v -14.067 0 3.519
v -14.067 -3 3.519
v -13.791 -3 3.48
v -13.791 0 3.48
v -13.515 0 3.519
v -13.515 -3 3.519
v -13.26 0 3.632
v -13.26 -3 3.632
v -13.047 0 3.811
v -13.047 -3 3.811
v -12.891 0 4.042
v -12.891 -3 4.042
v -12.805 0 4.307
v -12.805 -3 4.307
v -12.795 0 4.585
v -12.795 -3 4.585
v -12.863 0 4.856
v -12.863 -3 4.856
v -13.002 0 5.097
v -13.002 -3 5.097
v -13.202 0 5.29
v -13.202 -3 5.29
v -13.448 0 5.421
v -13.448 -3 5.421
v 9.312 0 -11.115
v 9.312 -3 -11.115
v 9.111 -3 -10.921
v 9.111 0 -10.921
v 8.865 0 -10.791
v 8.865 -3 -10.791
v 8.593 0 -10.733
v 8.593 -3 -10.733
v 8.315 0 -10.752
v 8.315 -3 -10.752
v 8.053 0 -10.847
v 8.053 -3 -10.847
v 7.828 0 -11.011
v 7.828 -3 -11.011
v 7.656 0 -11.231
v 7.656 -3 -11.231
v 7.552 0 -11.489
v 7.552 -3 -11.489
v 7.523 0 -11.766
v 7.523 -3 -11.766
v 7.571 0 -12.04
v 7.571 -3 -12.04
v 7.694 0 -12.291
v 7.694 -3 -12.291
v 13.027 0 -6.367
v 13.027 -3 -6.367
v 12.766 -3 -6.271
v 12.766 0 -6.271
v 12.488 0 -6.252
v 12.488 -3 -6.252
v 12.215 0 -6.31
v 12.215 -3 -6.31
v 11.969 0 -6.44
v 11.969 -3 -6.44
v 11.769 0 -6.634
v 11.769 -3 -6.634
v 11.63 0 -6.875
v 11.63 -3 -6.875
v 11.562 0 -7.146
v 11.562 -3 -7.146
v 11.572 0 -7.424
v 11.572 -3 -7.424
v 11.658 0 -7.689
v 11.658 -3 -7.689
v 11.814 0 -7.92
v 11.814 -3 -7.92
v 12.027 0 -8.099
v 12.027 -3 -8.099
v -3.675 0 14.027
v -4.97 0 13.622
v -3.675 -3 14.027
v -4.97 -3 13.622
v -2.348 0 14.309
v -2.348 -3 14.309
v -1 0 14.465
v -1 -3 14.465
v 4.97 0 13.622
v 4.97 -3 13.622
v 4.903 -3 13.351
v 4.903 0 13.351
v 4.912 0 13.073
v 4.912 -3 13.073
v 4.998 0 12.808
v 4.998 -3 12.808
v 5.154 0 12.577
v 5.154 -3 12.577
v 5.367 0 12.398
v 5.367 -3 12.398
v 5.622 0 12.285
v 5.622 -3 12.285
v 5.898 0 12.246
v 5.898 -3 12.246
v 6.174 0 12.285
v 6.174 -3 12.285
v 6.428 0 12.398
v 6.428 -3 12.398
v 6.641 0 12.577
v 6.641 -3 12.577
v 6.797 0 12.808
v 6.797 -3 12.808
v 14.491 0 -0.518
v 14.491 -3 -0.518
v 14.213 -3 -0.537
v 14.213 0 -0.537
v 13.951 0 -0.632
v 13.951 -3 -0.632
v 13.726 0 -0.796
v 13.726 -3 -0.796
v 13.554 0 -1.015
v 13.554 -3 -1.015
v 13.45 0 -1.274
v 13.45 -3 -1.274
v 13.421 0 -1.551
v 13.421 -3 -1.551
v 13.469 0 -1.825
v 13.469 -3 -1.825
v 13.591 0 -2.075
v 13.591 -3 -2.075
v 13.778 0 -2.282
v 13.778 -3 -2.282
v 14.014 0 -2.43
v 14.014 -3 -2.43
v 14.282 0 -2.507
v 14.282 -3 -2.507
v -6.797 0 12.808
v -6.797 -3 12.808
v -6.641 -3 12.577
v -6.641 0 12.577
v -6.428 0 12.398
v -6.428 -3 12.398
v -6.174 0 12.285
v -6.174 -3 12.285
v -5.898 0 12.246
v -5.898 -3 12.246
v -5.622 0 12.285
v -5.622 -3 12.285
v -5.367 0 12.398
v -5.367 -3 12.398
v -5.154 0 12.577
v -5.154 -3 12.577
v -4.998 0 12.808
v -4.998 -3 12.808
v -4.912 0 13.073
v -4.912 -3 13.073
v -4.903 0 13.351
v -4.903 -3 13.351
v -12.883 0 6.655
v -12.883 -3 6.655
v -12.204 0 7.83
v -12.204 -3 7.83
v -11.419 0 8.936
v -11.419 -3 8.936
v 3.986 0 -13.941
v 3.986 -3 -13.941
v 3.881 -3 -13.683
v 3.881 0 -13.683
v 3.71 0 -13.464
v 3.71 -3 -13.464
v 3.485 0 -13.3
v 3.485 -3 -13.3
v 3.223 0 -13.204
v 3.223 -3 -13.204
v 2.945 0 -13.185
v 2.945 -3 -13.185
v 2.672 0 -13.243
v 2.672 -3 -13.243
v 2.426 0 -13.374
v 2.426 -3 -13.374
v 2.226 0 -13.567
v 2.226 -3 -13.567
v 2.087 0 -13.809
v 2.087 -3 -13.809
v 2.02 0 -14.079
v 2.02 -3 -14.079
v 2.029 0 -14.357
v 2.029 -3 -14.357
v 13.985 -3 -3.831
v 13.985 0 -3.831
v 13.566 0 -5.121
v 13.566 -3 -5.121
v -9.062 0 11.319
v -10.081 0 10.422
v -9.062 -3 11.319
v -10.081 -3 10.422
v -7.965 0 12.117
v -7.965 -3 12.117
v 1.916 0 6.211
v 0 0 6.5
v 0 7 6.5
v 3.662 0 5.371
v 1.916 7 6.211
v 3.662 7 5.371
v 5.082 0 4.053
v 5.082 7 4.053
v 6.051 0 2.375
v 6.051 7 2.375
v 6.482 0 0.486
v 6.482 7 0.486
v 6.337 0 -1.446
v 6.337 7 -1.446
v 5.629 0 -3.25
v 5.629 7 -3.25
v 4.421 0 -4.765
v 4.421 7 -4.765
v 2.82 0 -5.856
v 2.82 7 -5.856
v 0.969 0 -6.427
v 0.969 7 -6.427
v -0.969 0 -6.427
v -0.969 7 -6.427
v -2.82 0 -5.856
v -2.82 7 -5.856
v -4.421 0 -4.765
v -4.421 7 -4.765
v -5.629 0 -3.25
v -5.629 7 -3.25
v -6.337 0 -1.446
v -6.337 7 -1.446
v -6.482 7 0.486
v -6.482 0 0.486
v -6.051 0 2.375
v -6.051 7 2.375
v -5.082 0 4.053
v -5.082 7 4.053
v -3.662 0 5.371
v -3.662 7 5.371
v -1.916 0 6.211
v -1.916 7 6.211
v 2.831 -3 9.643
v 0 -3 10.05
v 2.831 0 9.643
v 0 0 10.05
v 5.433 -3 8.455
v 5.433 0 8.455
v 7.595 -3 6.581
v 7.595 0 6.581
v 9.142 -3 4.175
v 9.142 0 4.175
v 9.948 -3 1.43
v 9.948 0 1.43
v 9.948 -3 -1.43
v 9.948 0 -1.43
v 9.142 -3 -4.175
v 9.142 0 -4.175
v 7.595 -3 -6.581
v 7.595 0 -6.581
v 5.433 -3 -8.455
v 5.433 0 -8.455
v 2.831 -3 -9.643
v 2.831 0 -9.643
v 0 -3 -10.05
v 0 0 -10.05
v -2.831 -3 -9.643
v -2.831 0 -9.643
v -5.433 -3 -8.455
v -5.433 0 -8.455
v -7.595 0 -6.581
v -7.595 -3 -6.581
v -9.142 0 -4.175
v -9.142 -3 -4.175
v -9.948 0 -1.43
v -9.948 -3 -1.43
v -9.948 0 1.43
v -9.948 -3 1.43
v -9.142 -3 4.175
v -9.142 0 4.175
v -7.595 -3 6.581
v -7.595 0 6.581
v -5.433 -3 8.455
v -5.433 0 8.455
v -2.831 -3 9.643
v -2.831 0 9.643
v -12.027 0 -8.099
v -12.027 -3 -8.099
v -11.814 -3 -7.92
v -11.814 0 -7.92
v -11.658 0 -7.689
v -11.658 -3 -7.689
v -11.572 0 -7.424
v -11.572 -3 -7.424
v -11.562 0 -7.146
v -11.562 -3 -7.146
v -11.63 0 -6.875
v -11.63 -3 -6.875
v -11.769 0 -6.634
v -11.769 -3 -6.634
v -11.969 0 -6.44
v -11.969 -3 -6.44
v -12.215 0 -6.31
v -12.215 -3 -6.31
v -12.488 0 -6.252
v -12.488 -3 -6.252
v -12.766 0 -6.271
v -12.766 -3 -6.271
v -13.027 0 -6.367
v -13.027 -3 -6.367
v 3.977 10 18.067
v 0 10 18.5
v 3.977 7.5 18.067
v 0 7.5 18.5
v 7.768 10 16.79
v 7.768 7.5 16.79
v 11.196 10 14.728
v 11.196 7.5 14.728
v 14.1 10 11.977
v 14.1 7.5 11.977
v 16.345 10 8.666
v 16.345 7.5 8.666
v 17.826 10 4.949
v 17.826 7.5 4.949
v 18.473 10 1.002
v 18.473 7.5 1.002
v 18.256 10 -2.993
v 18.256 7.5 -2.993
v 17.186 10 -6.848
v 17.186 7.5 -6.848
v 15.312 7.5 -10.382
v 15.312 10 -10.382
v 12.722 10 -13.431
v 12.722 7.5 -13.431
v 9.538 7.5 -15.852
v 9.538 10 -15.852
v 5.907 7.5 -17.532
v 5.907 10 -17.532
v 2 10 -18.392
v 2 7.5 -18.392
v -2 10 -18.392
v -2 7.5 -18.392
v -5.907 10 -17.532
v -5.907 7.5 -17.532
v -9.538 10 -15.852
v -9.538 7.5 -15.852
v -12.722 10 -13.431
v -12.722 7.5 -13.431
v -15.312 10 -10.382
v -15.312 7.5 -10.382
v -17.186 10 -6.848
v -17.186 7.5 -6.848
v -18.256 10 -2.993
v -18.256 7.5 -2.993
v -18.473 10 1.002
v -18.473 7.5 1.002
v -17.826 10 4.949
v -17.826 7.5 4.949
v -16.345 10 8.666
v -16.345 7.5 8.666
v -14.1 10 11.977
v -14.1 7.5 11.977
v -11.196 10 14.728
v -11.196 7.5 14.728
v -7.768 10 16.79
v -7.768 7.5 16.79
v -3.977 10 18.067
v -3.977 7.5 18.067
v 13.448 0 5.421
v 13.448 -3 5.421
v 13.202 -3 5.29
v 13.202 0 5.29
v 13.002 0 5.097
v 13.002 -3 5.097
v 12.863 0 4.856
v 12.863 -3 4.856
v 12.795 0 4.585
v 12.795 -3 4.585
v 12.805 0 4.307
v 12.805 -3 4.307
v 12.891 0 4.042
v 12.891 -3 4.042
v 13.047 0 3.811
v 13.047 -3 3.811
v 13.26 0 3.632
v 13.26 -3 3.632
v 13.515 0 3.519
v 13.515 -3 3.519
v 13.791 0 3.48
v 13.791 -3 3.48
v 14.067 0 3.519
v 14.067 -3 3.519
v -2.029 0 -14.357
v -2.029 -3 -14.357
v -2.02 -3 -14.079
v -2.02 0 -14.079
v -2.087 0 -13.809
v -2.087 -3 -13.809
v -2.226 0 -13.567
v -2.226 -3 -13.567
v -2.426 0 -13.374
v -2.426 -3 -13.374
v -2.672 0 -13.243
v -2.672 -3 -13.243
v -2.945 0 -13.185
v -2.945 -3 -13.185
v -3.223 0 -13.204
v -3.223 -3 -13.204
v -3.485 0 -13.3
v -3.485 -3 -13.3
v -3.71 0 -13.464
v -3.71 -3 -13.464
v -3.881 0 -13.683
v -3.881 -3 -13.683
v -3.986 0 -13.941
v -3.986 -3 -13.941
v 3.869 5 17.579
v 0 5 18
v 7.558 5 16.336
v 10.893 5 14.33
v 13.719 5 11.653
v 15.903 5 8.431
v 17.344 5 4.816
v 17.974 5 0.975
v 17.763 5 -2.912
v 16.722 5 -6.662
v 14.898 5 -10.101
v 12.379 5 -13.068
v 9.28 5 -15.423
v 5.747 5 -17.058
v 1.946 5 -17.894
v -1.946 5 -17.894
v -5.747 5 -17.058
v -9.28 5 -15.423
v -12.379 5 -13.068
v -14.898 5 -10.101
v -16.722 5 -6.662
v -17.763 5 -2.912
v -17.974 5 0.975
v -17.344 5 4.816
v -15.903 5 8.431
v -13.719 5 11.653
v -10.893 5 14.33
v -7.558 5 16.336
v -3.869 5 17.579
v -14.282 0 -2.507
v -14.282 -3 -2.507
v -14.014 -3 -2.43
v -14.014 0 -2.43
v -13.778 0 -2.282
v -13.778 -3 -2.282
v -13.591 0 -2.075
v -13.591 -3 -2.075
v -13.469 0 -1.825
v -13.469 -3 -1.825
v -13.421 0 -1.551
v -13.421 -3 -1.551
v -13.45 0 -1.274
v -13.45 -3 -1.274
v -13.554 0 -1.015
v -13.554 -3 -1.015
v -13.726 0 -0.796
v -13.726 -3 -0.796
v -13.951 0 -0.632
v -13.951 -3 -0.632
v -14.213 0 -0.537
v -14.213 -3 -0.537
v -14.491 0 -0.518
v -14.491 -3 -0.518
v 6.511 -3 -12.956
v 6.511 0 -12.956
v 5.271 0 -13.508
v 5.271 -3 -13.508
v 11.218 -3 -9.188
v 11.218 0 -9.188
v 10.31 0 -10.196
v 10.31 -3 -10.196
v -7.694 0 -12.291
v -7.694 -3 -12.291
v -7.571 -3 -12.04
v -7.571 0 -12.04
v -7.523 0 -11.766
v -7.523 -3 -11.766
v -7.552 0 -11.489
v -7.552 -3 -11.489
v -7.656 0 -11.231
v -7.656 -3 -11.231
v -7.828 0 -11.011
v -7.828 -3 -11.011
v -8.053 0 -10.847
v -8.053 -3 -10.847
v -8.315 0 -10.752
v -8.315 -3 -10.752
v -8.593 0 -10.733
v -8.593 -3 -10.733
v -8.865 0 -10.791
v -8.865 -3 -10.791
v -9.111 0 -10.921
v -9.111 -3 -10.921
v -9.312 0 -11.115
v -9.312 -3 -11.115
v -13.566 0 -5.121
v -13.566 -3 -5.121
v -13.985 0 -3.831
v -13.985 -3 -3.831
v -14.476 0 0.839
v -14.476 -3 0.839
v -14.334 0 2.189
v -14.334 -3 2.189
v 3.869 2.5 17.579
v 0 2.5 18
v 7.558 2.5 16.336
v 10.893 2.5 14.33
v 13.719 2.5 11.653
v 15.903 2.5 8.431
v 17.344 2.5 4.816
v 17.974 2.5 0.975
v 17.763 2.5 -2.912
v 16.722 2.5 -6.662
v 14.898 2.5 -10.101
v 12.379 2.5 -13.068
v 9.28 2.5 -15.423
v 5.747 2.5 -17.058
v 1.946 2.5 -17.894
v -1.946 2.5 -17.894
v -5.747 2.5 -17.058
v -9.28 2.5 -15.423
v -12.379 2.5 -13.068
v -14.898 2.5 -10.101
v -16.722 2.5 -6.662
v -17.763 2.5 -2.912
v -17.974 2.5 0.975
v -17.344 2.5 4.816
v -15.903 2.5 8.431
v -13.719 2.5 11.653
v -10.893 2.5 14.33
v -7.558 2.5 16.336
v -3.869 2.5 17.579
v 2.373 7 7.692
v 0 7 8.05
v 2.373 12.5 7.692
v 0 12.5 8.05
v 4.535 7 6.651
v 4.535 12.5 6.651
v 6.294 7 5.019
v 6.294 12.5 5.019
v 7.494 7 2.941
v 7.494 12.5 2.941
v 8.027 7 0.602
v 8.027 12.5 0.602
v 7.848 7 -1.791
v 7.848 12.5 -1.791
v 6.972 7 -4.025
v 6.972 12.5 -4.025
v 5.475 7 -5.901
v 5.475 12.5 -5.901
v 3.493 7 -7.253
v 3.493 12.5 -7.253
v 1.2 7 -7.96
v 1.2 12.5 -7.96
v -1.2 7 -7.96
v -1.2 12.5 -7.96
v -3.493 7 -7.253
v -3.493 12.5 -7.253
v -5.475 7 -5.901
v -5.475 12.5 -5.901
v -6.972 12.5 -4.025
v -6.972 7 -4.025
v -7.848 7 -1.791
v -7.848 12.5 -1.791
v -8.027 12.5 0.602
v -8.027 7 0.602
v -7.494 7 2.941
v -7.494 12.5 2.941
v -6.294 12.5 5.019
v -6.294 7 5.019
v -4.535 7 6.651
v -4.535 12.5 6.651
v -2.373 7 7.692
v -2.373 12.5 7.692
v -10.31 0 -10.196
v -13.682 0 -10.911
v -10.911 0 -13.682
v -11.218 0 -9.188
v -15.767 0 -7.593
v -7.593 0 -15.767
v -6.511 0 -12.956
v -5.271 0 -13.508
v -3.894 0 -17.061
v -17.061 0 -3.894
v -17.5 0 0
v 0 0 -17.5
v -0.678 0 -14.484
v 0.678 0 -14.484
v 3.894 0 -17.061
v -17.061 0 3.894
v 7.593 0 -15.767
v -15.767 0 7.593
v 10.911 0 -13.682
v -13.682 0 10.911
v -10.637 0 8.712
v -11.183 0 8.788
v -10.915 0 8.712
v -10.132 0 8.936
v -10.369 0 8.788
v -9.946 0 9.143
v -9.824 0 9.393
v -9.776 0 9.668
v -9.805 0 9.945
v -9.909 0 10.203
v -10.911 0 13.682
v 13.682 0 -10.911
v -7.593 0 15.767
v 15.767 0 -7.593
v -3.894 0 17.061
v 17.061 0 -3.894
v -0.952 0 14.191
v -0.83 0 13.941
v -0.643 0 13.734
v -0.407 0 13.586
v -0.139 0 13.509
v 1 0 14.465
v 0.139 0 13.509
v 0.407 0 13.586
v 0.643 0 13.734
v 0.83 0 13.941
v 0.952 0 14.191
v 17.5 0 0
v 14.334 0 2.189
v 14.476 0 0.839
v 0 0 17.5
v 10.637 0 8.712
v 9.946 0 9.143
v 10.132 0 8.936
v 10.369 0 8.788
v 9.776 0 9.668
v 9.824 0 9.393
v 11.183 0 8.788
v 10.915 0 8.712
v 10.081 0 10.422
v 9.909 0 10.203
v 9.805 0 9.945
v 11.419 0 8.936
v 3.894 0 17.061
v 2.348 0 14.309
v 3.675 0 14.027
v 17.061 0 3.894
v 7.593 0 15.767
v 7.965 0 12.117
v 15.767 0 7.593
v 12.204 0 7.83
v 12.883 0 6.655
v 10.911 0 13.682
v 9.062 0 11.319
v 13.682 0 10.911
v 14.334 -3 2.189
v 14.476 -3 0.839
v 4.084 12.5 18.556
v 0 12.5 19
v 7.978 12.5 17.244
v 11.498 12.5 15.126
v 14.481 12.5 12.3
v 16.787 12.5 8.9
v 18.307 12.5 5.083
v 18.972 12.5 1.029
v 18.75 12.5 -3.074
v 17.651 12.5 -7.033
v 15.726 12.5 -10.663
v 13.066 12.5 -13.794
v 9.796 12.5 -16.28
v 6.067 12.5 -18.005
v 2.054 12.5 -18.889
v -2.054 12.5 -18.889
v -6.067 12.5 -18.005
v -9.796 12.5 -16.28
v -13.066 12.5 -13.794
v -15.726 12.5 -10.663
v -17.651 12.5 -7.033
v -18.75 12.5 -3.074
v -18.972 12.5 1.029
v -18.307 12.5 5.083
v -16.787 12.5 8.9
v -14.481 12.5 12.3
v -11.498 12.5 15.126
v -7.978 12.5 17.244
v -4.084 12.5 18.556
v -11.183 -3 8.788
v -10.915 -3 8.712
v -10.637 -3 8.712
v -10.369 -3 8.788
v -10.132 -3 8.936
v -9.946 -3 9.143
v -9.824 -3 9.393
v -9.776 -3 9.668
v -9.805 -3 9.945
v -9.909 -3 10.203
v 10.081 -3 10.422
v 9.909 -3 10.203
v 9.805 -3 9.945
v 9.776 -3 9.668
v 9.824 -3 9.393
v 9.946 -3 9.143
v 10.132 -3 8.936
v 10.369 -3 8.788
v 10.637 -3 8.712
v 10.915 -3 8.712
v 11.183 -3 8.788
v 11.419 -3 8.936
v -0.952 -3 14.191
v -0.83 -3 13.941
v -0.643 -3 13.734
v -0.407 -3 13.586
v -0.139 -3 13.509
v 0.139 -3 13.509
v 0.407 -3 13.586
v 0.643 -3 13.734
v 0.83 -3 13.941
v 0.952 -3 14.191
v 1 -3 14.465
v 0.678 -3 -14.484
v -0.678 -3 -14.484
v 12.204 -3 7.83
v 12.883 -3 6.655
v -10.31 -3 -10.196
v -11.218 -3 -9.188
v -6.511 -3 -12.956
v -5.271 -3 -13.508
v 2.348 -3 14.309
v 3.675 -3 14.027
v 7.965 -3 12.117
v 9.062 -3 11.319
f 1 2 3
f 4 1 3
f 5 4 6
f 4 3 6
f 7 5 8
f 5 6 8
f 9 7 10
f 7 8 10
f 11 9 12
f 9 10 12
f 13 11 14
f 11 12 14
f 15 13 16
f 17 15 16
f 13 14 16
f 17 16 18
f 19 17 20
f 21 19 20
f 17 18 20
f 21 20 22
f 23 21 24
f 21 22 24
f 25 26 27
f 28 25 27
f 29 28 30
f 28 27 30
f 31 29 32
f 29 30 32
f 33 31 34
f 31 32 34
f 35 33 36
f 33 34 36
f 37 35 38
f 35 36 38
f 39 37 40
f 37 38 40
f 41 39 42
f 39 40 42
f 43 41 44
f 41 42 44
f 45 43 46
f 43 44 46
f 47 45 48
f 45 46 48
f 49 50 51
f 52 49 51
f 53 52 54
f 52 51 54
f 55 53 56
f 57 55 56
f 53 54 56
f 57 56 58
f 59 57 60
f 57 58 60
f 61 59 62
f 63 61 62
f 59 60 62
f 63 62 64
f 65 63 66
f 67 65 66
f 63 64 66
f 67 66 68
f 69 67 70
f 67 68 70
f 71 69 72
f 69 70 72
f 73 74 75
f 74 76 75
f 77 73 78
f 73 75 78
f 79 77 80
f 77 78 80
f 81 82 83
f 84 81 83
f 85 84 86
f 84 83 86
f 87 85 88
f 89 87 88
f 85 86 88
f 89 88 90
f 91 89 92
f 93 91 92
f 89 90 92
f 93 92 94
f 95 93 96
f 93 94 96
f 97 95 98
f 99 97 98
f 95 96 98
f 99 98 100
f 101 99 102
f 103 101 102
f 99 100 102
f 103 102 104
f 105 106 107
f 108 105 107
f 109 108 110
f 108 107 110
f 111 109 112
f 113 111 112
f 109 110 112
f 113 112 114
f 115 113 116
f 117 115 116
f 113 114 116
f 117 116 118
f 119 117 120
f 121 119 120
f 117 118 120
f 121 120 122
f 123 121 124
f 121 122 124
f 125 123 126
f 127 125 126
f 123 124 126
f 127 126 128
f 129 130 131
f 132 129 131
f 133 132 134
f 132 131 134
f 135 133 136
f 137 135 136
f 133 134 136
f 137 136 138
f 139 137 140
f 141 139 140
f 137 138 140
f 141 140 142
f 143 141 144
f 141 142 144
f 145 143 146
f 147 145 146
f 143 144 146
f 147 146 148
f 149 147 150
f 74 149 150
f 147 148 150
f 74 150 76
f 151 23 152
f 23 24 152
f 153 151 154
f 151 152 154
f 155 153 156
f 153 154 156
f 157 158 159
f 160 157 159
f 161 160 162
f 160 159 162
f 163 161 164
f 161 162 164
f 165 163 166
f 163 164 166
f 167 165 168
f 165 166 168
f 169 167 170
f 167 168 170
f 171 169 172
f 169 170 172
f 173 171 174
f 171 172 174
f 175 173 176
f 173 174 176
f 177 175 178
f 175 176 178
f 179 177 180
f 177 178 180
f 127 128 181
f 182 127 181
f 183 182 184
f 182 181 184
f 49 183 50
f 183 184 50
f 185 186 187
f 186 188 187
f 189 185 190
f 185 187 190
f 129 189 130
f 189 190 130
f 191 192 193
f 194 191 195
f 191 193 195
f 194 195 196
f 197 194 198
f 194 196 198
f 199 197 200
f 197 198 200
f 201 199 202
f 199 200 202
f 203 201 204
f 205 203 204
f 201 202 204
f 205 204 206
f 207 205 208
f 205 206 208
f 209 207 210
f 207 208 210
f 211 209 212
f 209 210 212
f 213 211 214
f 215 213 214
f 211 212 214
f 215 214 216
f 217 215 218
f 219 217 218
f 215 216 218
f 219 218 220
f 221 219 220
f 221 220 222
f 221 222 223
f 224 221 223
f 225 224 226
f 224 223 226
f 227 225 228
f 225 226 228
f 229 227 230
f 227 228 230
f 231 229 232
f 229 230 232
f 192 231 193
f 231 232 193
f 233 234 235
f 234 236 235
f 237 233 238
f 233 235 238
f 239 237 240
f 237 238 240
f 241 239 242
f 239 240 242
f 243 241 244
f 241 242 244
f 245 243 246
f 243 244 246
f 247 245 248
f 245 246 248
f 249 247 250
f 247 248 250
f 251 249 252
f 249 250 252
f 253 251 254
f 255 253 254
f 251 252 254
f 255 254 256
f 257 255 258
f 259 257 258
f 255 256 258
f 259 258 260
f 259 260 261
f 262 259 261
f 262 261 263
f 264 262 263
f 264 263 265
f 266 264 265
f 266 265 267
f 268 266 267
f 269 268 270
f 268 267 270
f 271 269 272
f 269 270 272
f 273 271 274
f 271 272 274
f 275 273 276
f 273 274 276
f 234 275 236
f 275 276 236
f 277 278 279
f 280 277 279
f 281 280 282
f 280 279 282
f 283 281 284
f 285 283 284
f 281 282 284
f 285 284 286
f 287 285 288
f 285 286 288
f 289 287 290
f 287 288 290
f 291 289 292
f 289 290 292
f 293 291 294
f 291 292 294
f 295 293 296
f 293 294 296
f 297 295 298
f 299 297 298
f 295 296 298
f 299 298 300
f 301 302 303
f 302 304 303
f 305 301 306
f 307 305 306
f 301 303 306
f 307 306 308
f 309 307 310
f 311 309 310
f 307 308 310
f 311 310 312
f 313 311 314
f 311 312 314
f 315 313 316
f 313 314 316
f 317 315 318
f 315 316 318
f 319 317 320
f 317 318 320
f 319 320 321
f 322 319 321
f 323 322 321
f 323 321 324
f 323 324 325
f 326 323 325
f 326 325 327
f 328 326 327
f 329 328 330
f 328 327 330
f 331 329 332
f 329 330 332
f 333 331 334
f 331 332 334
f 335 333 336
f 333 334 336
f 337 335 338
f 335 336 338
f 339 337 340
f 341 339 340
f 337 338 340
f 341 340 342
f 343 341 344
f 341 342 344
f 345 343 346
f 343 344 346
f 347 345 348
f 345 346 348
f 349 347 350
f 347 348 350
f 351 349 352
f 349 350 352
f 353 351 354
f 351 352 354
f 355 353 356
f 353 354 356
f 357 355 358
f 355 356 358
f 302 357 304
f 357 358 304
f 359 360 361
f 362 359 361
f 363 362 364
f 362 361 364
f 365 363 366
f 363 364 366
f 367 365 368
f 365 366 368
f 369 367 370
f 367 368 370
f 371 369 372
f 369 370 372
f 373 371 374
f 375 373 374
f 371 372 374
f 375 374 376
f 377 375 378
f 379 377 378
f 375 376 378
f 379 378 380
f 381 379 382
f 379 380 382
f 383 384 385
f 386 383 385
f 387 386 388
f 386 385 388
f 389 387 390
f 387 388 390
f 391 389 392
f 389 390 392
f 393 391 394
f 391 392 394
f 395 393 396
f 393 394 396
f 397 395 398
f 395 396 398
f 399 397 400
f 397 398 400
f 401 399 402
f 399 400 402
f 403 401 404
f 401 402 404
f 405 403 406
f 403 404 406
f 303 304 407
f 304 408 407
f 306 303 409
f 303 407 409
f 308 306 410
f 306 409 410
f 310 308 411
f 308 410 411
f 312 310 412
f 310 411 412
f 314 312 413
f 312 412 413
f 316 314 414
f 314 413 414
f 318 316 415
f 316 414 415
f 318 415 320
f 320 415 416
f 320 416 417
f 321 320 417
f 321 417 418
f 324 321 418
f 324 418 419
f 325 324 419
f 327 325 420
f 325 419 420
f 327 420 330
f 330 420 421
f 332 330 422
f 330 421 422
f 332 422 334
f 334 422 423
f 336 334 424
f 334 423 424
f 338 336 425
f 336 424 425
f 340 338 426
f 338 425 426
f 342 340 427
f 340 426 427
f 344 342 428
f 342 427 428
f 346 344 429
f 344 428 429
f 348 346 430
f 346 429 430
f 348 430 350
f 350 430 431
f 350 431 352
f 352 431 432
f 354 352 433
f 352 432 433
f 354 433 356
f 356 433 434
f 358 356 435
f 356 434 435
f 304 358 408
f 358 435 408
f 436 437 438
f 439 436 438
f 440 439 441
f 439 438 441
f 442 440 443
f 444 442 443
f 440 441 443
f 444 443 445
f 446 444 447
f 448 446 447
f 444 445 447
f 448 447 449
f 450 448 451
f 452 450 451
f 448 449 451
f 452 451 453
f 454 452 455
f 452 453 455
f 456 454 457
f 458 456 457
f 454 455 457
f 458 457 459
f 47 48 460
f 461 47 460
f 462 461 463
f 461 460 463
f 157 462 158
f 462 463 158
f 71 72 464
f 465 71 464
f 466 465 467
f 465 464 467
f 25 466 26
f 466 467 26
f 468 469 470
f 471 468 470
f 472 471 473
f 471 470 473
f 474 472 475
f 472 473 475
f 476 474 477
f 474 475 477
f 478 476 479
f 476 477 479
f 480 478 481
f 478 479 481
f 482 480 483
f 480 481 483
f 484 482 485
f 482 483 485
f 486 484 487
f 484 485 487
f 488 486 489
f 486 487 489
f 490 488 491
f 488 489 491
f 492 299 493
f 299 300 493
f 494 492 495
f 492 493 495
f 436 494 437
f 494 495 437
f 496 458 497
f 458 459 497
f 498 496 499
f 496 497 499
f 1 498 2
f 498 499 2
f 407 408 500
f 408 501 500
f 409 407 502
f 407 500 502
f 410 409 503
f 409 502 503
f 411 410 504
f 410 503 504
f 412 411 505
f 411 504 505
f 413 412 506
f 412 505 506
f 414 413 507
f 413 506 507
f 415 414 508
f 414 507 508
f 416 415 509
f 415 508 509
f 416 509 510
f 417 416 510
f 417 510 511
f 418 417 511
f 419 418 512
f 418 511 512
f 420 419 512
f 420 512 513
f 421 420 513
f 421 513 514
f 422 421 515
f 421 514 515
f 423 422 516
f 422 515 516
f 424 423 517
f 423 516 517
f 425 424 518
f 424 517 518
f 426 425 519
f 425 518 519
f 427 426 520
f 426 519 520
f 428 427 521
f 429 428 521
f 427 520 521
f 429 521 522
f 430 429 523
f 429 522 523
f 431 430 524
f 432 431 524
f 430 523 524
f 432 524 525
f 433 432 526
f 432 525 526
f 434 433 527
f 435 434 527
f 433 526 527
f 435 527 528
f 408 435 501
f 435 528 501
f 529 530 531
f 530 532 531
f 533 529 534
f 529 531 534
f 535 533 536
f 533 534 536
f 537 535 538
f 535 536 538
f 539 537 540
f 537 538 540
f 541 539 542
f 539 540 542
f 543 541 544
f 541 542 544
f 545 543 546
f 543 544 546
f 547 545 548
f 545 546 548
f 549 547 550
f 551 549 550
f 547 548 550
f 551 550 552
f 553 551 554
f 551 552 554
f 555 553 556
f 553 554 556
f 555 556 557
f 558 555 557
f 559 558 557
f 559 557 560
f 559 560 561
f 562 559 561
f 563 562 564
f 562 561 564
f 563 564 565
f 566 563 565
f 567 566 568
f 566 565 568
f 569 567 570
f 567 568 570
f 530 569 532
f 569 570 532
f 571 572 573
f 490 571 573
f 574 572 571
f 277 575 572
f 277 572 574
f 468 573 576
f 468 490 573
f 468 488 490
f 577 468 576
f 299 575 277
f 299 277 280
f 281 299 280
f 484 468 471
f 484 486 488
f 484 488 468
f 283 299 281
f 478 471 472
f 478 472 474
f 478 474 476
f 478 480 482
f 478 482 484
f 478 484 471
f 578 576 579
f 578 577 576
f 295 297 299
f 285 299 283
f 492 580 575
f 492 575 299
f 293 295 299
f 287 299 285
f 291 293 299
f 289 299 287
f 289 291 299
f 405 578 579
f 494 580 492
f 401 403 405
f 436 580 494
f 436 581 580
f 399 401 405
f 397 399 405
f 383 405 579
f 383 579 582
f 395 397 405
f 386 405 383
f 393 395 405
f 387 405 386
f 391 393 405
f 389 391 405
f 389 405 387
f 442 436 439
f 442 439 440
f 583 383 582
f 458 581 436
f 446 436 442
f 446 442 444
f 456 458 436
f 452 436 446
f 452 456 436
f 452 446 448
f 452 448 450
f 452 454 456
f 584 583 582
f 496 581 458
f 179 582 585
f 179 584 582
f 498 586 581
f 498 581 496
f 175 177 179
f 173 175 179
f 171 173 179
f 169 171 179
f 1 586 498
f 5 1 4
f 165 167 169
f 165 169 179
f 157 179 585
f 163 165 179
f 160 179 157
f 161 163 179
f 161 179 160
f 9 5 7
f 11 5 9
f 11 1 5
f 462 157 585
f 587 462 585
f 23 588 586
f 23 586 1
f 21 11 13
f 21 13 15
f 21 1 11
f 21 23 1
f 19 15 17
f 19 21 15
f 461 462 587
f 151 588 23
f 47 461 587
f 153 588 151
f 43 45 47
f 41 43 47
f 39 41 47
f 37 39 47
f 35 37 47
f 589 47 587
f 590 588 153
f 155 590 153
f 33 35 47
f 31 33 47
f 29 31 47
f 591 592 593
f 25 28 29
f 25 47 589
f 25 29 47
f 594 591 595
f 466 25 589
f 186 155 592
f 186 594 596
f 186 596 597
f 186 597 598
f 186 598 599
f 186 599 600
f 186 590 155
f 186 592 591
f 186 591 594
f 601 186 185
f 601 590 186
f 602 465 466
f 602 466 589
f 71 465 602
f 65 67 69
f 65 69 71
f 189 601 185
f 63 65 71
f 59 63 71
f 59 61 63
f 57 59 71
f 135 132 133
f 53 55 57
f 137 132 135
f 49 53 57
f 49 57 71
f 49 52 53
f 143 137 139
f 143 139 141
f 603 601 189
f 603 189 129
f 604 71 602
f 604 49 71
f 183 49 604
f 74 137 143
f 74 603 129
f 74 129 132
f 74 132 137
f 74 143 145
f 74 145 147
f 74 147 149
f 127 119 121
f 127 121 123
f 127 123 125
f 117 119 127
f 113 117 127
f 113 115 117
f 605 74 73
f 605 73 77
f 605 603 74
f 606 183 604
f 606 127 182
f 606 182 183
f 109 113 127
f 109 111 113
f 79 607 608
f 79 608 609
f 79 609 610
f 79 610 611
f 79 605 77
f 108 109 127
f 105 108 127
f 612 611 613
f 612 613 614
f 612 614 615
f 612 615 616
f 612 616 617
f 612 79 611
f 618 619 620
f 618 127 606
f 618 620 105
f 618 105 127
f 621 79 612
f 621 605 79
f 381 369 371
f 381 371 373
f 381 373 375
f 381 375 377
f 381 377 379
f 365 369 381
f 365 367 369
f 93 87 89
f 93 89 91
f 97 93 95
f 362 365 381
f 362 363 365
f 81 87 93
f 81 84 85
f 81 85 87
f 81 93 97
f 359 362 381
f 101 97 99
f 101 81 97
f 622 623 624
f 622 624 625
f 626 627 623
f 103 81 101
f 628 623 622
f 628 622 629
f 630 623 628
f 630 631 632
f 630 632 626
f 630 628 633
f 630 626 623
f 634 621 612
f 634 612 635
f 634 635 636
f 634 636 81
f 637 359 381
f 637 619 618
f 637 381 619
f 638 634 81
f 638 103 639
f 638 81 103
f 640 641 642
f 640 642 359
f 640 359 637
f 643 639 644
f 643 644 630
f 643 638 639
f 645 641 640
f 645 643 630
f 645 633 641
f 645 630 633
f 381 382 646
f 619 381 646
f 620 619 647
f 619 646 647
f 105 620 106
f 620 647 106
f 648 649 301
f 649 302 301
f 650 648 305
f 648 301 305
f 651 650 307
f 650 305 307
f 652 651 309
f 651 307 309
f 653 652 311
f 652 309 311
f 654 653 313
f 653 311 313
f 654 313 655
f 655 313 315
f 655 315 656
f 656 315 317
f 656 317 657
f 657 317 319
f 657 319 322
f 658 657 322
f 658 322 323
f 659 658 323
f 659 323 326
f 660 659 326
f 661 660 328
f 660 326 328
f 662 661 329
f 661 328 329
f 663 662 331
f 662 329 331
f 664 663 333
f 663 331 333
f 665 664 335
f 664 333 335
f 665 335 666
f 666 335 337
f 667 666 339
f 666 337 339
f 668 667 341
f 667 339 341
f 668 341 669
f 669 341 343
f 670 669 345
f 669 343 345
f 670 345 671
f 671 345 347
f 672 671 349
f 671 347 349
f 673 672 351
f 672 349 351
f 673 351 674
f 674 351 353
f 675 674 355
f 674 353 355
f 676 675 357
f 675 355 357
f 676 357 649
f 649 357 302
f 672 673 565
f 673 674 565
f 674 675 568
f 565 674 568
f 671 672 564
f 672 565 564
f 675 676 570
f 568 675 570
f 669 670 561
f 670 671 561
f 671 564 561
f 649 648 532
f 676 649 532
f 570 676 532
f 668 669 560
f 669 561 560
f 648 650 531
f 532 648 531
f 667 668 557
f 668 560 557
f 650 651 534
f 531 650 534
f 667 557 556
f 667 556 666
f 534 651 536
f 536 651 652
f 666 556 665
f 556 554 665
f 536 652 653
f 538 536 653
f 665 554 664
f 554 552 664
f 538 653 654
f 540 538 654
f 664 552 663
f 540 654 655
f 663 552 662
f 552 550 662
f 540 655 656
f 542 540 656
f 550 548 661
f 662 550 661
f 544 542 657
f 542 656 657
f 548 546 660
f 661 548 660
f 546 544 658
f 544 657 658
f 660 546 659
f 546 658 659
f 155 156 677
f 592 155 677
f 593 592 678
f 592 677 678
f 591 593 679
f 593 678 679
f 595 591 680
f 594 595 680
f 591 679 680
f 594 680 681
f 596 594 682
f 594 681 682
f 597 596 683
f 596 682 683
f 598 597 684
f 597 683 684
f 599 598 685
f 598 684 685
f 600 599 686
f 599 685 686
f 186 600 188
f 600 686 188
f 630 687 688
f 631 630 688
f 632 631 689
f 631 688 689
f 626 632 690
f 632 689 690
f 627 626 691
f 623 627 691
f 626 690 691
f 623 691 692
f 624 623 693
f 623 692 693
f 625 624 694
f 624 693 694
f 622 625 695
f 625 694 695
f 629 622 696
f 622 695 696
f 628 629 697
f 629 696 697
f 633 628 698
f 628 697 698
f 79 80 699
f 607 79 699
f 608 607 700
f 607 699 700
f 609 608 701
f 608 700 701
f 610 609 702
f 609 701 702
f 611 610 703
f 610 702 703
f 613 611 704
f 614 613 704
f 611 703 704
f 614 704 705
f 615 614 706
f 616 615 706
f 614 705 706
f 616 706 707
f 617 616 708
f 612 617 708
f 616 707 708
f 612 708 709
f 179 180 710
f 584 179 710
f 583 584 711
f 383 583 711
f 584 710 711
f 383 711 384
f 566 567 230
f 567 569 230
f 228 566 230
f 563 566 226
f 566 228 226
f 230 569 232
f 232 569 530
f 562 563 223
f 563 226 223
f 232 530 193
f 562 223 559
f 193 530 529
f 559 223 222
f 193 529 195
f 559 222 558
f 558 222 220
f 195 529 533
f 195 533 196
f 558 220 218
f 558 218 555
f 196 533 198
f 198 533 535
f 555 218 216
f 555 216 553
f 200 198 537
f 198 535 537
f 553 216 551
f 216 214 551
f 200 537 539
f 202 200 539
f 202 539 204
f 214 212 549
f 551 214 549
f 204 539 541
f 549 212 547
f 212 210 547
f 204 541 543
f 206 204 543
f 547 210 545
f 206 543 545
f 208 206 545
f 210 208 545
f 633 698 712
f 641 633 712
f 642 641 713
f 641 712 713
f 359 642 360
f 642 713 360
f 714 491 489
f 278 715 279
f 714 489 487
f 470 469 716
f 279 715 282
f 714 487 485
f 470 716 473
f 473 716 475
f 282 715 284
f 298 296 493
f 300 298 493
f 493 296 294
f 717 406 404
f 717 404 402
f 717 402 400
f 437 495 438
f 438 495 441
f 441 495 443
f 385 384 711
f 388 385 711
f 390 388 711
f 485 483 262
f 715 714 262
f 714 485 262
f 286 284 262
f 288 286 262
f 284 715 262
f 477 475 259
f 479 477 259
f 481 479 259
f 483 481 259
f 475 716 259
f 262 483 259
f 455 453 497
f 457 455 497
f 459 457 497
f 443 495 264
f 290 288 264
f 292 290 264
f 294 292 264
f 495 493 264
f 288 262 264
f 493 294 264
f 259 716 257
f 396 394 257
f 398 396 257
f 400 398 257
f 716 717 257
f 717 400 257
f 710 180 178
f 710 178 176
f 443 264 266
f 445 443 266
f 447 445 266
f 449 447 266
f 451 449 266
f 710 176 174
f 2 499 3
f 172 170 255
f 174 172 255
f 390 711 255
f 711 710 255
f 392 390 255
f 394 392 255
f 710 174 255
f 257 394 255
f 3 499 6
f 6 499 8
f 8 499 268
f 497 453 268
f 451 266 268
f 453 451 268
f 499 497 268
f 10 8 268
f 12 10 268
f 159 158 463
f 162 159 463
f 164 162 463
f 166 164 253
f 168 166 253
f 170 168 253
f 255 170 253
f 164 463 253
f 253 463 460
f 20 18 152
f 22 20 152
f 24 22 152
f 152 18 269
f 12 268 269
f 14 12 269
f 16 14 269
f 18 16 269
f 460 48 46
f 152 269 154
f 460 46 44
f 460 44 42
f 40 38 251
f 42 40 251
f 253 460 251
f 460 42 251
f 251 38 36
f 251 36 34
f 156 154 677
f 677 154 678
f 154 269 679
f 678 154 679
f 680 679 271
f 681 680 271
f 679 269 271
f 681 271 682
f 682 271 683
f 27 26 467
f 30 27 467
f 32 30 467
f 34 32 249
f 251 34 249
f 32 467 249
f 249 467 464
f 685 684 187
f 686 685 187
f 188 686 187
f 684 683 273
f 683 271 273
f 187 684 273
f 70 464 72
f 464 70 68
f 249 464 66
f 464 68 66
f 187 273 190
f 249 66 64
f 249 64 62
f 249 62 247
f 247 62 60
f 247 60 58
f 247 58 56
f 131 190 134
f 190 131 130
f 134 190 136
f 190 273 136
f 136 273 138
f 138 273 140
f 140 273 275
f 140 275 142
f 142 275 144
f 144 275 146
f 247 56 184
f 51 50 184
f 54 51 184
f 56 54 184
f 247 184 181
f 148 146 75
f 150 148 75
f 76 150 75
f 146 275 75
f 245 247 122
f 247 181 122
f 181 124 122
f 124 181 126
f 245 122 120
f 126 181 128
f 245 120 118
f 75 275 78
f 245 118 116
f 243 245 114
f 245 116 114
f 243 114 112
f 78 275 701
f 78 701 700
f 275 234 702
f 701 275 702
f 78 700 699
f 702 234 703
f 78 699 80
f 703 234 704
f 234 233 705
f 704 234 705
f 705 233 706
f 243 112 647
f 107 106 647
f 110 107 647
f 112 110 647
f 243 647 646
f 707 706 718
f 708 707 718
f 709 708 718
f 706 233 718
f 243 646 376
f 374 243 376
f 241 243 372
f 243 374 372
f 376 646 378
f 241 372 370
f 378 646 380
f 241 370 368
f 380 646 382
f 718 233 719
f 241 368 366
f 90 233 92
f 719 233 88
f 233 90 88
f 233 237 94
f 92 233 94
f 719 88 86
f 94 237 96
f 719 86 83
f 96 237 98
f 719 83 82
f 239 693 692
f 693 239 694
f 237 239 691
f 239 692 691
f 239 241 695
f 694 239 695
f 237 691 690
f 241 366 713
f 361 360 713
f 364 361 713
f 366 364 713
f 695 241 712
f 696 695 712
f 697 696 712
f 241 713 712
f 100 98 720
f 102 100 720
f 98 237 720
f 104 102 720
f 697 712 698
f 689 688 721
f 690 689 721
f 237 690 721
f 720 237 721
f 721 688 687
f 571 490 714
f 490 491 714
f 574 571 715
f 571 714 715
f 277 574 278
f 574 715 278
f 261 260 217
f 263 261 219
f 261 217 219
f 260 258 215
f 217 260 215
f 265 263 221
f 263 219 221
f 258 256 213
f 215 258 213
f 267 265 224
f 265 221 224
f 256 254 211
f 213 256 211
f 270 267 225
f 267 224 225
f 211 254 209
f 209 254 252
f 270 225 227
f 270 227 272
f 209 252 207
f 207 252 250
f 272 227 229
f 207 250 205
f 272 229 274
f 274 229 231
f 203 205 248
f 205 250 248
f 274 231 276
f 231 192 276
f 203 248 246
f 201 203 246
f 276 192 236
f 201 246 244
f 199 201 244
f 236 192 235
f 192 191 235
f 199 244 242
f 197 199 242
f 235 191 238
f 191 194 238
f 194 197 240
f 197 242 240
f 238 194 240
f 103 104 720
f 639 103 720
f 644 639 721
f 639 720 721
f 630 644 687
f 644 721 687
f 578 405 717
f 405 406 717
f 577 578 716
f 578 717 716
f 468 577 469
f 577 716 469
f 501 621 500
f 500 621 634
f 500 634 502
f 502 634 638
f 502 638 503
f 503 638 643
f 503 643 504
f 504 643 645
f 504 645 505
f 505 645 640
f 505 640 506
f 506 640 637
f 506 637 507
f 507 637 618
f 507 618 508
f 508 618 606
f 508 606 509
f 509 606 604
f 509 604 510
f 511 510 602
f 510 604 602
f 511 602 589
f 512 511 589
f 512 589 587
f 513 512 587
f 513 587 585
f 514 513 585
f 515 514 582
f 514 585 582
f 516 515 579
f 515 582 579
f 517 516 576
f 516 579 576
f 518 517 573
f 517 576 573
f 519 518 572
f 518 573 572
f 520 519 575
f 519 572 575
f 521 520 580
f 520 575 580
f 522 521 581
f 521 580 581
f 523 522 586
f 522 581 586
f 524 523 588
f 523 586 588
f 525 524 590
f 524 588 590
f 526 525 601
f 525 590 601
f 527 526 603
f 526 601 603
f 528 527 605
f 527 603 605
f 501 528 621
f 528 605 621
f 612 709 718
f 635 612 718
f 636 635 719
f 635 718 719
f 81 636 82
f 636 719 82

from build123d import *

# Parameters (mm, degrees)
F3_DEPTH = 3


with BuildPart() as f1:
    # F0 (on Right) → F1 (revolve)
    with BuildSketch(Plane.YZ):
        Polygon((0, 6.5), (7, 6.5), (7, 8.05), (12.5, 8.05), (12.5, 19), (10, 18.5), (7.5, 18.5), (5, 18), (2.5, 18), (0, 17.5), (0, 14.5), (-3, 14.5), (-3, 10.05), (0, 10.05), align=None)
    revolve(axis=Axis((0, 20.883844794, 0), (0, 1, 0)))

    # F2 (on face) → F3 (cut)
    with BuildSketch(Plane.XZ.offset(3)):
        with BuildLine():
            ThreePointArc((1, 14.4654761415), (0, 14.5), (-1, 14.4654761415))
            ThreePointArc((-1, 14.4654761415), (0, 13.4994042291), (1, 14.4654761415))
        make_face()
        with BuildLine():
            ThreePointArc((-4.9700937486, 13.6216066648), (-5.8976813246, 13.2464091358), (-6.7971846639, 12.8081333786))
            ThreePointArc((-6.7971846639, 12.8081333786), (-5.4907023597, 12.3323194143), (-4.9700937486, 13.6216066648))
        make_face()
        with BuildLine():
            ThreePointArc((-10.0808131363, 10.4224376473), (-10.7755999694, 9.7023937922), (-11.419074349, 8.9361479963))
            ThreePointArc((-11.419074349, 8.9361479963), (-10.0320123999, 9.0328645373), (-10.0808131363, 10.4224376473))
        make_face()
        with BuildLine():
            ThreePointArc((-13.4484683513, 5.4211344757), (-13.7903194863, 4.4807464184), (-14.0665023401, 3.5190214432))
            ThreePointArc((-14.0665023401, 3.5190214432), (-12.8386963582, 4.1715453207), (-13.4484683513, 5.4211344757))
        make_face()
        with BuildLine():
            ThreePointArc((-14.4907612129, -0.5175320961), (-14.4205674828, -1.5156627174), (-14.2817042864, -2.5065758869))
            ThreePointArc((-14.2817042864, -2.5065758869), (-13.4254530802, -1.4110719791), (-14.4907612129, -0.5175320961))
        make_face()
        with BuildLine():
            ThreePointArc((-13.0274698164, -6.366712667), (-12.5573683549, -7.25), (-12.0274698164, -8.0987634745))
            ThreePointArc((-12.0274698164, -8.0987634745), (-11.6908269983, -6.7497021145), (-13.0274698164, -6.366712667))
        make_face()
        with BuildLine():
            ThreePointArc((-9.3116105377, -11.1150307779), (-8.5228861582, -11.7307464184), (-7.693576549, -12.2906012825))
            ThreePointArc((-7.693576549, -12.2906012825), (-7.9347507206, -10.9212474353), (-9.3116105377, -11.1150307779))
        make_face()
        with BuildLine():
            ThreePointArc((-3.9856892038, -13.9414590905), (-3.0147195169, -14.1831402106), (-2.0293940023, -14.3572824721))
            ThreePointArc((-2.0293940023, -14.3572824721), (-2.8066839583, -13.204409858), (-3.9856892038, -13.9414590905))
        make_face()
        with BuildLine():
            ThreePointArc((2.0293940023, -14.3572824721), (3.0147195169, -14.1831402106), (3.9856892038, -13.9414590905))
            ThreePointArc((3.9856892038, -13.9414590905), (2.8066839583, -13.204409858), (2.0293940023, -14.3572824721))
        make_face()
        with BuildLine():
            ThreePointArc((7.693576549, -12.2906012825), (8.5228861582, -11.7307464184), (9.3116105377, -11.1150307779))
            ThreePointArc((9.3116105377, -11.1150307779), (7.9347507206, -10.9212474353), (7.693576549, -12.2906012825))
        make_face()
        with BuildLine():
            ThreePointArc((12.0274698164, -8.0987634745), (12.5573683549, -7.25), (13.0274698164, -6.366712667))
            ThreePointArc((13.0274698164, -6.366712667), (11.6908269983, -6.7497021145), (12.0274698164, -8.0987634745))
        make_face()
        with BuildLine():
            ThreePointArc((14.2817042864, -2.5065758869), (14.4205674828, -1.5156627174), (14.4907612129, -0.5175320961))
            ThreePointArc((14.4907612129, -0.5175320961), (13.4254530802, -1.4110719791), (14.2817042864, -2.5065758869))
        make_face()
        with BuildLine():
            ThreePointArc((14.0665023401, 3.5190214432), (13.7903194863, 4.4807464184), (13.4484683513, 5.4211344757))
            ThreePointArc((13.4484683513, 5.4211344757), (12.8386963582, 4.1715453207), (14.0665023401, 3.5190214432))
        make_face()
        with BuildLine():
            ThreePointArc((11.419074349, 8.9361479963), (10.7755999694, 9.7023937922), (10.0808131363, 10.4224376473))
            ThreePointArc((10.0808131363, 10.4224376473), (10.0320123999, 9.0328645373), (11.419074349, 8.9361479963))
        make_face()
        with BuildLine():
            ThreePointArc((6.7971846639, 12.8081333786), (5.8976813246, 13.2464091358), (4.9700937486, 13.6216066648))
            ThreePointArc((4.9700937486, 13.6216066648), (5.4907023597, 12.3323194143), (6.7971846639, 12.8081333786))
        make_face()
    extrude(amount=-F3_DEPTH, mode=Mode.SUBTRACT)


solid = f1.part
